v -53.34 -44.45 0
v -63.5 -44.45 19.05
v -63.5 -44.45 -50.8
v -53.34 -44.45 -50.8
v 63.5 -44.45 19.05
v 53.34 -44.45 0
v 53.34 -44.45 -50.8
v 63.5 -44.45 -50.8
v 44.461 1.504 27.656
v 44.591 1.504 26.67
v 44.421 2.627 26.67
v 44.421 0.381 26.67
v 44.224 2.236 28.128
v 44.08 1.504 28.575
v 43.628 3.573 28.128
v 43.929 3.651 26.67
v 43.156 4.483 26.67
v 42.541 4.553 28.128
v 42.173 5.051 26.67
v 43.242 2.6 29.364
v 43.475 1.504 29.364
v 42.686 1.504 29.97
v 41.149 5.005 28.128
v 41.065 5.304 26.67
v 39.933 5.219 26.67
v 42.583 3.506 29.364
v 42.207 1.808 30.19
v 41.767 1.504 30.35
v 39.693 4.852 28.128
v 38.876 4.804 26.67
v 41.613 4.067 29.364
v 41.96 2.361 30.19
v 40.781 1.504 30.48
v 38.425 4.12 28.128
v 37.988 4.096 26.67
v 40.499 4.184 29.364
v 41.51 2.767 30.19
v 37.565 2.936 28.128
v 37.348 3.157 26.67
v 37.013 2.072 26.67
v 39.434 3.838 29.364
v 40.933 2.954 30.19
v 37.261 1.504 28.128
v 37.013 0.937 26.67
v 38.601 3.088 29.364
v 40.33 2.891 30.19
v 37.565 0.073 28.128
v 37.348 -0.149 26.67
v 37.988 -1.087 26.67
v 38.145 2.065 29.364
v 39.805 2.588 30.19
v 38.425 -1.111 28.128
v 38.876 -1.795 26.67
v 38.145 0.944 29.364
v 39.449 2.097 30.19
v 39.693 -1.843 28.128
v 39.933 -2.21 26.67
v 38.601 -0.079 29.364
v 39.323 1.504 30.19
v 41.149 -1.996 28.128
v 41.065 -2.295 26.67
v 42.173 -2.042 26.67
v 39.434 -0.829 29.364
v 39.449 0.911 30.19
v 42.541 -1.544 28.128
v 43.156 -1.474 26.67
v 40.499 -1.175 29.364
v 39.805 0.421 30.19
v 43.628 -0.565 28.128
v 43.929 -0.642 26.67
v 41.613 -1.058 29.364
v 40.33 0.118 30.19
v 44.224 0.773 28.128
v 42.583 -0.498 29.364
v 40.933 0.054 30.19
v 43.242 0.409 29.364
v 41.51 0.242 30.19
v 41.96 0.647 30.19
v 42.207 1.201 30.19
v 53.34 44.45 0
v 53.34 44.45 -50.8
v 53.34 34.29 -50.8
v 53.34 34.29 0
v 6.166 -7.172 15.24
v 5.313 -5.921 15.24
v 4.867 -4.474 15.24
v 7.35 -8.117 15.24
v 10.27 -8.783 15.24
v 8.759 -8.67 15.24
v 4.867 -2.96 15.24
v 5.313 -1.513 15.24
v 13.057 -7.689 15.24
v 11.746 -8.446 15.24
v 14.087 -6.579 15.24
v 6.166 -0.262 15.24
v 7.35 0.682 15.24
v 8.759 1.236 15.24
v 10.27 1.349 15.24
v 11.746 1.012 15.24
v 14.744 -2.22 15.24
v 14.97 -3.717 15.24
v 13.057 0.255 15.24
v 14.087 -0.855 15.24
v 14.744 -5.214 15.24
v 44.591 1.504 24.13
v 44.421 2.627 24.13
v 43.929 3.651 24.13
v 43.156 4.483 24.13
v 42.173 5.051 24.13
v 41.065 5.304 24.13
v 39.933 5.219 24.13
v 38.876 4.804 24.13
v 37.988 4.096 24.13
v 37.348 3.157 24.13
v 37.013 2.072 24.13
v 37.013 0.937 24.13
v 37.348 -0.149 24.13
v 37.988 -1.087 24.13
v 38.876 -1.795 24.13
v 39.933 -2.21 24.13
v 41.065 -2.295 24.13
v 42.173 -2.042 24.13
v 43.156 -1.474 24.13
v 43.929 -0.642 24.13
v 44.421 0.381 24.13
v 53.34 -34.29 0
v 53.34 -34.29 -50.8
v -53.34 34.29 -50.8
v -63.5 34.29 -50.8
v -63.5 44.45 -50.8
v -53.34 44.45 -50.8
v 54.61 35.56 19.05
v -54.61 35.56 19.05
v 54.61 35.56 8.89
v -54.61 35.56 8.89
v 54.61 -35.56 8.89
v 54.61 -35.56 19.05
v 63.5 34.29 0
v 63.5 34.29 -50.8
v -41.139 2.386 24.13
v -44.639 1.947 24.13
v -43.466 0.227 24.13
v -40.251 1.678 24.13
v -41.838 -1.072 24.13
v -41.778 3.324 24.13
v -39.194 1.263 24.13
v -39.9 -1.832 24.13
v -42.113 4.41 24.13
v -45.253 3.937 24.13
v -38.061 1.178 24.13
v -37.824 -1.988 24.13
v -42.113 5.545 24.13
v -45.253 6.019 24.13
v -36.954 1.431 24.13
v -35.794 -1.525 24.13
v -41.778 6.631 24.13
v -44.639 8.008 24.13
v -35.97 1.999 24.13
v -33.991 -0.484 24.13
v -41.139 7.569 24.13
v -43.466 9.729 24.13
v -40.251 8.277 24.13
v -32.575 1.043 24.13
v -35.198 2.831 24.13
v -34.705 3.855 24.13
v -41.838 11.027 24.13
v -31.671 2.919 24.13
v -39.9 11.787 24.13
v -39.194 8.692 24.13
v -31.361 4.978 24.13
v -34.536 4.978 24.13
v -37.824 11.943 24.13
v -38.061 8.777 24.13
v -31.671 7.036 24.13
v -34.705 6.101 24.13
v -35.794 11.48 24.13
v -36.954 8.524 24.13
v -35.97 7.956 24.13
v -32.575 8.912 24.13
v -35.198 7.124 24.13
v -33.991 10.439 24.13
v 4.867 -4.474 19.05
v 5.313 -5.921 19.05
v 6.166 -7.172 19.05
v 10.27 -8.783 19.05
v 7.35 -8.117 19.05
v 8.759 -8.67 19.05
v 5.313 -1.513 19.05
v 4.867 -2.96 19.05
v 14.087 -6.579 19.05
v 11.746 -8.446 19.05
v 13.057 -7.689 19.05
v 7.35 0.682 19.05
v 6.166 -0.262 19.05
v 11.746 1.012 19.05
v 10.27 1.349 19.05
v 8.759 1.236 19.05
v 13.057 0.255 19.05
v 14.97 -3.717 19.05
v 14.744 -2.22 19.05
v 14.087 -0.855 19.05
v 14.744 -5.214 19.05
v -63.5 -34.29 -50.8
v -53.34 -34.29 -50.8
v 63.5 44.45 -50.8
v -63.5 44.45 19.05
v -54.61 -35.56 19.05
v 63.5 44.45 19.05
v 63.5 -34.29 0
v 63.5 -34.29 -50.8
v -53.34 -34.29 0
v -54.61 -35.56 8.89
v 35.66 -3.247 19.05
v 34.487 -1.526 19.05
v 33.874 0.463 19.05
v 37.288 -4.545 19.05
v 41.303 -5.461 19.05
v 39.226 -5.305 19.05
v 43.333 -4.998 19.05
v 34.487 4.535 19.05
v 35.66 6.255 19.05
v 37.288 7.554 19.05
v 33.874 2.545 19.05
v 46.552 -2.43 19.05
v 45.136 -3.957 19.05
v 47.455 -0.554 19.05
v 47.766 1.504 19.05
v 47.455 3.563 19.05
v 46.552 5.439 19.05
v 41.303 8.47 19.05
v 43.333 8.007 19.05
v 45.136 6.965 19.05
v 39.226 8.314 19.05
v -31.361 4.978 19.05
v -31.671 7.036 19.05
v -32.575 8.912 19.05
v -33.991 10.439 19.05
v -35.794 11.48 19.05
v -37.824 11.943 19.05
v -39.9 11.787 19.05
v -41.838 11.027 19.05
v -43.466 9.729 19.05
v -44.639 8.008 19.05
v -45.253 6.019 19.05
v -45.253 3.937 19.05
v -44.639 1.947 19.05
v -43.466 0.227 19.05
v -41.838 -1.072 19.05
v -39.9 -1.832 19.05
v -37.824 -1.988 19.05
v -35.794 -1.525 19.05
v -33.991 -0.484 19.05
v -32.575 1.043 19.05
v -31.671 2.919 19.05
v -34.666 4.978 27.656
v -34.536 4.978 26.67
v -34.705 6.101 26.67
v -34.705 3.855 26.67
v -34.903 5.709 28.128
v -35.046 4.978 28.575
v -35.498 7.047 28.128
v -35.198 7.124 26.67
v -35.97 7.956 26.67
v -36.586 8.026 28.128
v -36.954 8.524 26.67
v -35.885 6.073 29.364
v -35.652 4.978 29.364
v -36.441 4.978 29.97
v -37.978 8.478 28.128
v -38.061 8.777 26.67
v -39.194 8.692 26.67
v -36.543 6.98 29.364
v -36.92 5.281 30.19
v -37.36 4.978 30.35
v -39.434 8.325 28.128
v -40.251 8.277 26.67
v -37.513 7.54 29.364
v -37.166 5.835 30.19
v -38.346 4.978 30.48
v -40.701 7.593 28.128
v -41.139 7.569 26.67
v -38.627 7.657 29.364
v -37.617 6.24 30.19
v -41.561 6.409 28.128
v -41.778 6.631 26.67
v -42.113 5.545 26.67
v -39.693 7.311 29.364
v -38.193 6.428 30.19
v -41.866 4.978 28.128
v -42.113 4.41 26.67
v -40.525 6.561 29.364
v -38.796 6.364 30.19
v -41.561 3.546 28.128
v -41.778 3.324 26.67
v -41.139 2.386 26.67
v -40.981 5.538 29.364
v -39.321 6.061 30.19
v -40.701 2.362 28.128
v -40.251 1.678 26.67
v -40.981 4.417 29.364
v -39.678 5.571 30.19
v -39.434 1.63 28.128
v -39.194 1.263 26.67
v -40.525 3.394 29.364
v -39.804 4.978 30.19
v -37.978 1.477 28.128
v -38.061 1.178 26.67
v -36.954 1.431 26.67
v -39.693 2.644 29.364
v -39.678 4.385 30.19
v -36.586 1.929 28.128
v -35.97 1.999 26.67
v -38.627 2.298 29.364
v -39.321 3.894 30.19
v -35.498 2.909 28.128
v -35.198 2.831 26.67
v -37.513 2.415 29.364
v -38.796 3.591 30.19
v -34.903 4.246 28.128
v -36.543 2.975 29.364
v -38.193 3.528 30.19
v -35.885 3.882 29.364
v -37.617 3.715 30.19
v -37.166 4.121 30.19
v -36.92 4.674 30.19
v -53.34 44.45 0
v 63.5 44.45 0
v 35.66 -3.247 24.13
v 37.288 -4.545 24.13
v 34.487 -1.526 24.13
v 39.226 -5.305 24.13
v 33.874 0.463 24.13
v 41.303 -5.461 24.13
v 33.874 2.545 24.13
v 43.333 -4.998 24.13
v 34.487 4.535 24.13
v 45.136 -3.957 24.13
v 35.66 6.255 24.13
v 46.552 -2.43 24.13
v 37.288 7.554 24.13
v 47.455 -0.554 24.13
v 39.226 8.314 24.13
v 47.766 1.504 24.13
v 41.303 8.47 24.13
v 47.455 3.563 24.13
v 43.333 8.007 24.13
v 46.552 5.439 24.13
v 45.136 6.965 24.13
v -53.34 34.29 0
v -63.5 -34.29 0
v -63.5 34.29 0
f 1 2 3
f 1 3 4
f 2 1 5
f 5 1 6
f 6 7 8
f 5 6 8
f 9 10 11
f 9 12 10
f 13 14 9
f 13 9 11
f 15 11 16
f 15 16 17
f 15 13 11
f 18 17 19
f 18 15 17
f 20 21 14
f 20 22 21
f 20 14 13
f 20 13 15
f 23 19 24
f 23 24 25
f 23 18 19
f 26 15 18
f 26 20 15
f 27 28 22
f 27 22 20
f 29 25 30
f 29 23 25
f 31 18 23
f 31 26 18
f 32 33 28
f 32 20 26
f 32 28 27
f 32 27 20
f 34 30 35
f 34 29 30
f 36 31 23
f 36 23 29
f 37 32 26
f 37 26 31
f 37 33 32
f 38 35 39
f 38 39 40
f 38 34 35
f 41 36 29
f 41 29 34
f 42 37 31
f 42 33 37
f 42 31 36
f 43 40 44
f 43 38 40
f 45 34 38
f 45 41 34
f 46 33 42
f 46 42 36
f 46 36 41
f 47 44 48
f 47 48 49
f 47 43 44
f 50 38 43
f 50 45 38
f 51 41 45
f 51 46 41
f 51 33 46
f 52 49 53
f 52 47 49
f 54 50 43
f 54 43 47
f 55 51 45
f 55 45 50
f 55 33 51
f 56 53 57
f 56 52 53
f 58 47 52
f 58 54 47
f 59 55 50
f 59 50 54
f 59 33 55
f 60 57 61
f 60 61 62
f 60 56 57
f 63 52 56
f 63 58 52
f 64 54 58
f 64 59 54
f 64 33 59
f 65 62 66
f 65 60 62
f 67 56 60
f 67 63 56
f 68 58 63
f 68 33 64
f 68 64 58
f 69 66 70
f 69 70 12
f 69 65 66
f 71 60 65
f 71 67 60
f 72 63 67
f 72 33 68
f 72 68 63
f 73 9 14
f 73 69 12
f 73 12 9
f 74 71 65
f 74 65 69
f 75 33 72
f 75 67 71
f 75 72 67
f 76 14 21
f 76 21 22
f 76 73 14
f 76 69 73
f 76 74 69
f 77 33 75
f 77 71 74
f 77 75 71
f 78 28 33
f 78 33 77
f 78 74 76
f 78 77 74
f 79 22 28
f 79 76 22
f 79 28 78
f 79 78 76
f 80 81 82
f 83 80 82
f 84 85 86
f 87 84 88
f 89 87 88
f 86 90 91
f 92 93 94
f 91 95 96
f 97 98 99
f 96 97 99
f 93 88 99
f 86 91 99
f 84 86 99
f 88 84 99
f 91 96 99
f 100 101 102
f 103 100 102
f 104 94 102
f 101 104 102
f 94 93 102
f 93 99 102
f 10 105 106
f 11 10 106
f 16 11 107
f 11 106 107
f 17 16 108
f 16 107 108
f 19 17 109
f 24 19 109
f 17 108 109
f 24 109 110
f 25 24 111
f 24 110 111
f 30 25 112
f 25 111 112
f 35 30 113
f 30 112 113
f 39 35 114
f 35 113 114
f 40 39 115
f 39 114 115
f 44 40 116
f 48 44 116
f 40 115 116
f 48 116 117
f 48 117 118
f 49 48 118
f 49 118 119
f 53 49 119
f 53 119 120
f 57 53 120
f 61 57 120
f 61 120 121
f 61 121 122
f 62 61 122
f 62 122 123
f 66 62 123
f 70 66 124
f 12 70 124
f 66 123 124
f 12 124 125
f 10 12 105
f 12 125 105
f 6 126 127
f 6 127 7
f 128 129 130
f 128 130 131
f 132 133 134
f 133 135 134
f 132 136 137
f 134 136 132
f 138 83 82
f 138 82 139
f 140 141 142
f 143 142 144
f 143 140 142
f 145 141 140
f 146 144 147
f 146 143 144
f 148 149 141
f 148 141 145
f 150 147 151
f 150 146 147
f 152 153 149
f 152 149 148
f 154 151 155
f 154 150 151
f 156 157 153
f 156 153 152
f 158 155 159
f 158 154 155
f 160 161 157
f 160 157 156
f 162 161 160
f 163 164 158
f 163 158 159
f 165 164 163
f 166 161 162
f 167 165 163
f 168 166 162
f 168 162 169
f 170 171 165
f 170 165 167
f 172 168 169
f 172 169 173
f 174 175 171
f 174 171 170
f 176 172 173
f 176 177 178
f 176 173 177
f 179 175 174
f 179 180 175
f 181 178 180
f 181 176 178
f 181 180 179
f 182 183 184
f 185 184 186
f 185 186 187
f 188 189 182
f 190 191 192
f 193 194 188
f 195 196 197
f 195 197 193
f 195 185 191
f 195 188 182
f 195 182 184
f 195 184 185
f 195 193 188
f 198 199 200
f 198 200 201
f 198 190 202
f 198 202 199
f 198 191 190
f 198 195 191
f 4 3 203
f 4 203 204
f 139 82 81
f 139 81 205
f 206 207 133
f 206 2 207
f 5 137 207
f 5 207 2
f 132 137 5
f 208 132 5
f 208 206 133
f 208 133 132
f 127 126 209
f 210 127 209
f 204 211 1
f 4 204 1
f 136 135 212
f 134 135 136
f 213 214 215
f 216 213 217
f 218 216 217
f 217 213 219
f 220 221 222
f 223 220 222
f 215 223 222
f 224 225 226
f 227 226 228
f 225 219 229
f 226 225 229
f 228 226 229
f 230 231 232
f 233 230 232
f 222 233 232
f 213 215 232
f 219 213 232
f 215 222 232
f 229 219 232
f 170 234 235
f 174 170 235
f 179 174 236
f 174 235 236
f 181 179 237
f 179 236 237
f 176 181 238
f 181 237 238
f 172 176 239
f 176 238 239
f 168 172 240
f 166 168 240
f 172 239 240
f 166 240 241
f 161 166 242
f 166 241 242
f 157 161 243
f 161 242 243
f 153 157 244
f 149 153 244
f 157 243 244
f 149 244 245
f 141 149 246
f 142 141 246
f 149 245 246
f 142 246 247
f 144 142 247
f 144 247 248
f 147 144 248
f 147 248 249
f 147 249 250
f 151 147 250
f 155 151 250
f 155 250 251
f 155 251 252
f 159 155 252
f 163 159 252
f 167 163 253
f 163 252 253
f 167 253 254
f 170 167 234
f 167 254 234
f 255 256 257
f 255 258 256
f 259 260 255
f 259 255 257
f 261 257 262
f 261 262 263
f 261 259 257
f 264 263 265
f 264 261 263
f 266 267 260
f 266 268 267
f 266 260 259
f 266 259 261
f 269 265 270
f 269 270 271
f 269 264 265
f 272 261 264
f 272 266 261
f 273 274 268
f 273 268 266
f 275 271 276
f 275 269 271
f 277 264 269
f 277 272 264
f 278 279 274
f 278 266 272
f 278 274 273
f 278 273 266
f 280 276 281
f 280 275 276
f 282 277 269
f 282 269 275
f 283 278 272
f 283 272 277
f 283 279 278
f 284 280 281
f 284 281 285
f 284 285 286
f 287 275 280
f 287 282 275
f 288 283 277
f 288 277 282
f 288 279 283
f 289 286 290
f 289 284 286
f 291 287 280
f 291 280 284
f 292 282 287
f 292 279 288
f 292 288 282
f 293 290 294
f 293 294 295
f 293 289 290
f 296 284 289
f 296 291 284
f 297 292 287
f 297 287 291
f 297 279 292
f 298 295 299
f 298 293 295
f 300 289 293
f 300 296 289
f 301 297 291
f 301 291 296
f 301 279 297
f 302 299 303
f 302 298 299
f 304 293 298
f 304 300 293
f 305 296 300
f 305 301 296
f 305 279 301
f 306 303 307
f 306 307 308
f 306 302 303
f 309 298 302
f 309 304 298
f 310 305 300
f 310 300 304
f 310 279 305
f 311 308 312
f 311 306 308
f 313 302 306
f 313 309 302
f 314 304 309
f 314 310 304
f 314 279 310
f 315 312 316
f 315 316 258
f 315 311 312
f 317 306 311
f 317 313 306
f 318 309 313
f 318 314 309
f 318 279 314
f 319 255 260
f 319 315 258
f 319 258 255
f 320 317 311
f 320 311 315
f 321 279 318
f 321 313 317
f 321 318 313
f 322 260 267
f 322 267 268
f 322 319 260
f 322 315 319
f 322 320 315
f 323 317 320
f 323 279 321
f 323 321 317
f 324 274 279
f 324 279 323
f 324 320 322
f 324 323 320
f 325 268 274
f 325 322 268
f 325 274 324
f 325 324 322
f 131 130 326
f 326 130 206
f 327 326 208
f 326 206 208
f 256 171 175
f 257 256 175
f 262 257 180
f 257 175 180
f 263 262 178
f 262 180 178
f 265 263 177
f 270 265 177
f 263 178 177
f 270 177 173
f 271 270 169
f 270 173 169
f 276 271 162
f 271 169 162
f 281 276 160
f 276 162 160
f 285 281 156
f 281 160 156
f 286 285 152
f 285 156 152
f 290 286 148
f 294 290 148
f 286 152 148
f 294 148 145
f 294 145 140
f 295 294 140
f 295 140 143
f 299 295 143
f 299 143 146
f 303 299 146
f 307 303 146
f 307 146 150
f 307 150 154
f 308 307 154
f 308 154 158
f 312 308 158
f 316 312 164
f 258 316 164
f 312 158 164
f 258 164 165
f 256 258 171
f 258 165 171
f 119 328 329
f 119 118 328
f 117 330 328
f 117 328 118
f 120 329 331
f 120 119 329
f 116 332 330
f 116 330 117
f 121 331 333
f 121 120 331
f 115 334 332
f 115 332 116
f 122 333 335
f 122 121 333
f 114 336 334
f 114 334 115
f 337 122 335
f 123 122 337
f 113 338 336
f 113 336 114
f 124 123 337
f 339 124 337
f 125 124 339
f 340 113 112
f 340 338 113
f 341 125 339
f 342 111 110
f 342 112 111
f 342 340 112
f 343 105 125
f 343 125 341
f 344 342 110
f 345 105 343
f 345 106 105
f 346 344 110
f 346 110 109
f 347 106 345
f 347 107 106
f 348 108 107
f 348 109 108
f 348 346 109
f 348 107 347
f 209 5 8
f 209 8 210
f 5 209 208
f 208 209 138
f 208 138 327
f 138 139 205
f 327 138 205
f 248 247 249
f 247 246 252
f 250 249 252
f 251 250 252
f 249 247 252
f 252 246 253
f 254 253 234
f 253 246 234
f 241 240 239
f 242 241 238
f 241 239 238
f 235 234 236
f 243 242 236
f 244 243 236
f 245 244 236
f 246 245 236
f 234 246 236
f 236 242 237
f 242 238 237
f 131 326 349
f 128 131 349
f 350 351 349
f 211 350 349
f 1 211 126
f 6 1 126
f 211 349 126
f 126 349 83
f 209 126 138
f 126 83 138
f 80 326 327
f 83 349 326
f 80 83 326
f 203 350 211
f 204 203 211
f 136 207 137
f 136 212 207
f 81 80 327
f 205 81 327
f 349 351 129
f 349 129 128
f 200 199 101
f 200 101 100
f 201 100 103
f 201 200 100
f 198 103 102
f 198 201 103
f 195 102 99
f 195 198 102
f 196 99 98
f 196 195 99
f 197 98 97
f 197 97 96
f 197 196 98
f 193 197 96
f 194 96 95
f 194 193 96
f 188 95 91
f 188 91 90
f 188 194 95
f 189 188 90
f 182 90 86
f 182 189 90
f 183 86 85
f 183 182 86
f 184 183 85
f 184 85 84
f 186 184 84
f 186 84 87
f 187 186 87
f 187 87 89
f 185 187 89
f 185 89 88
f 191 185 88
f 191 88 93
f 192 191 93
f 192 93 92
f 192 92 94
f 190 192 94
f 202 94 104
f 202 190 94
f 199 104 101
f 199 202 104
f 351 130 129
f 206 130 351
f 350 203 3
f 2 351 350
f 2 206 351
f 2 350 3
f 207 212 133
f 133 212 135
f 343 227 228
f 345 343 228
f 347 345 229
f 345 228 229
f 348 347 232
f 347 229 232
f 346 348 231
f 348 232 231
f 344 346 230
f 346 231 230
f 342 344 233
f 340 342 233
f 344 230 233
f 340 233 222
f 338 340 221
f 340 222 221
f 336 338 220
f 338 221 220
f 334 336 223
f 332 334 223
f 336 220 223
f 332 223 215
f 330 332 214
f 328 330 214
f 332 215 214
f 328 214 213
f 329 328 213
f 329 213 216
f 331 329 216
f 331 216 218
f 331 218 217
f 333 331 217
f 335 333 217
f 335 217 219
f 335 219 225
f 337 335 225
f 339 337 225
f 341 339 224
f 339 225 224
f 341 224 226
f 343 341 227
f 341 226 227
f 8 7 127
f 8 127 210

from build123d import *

# Parameters (mm, degrees)
F0_W      = 127
F0_H      = 88.9
F1_DEPTH  = 19.05
F3_T      = -8.89
F4_W      = 10.16
F4_H      = 10.16
F4_H_2    = 10.159999
F5_DEPTH  = 50.8
F6_R      = 5.08
F7_DEPTH  = 3.81
F8_R      = 6.985
F9_DEPTH  = 5.08
F10_R     = 3.81
F11_DEPTH = 6.35
F12_R     = 3.81
F13_R     = 6.985
F14_DEPTH = 5.08
F15_R     = 3.81
F16_DEPTH = 6.35
F17_R     = 3.81


with BuildPart() as f1:
    # F0 (on Top) → F1 (new body)
    with BuildSketch(Plane.XY):
        Rectangle(F0_W, F0_H)
    extrude(amount=F1_DEPTH)

    # F3
    f3_openings = [f1.faces().sort_by_distance(p)[0] for p in [
        (0, 0, 19.05),
    ]]
    offset(amount=F3_T, openings=f3_openings)

    # F4 (on face) → F5 (join)
    with BuildSketch(Plane(origin=(0, 0, 0), x_dir=(1, 0, 0), z_dir=(0, 0, -1))):
        with Locations((-58.42, -39.37)):
            Rectangle(F4_W, F4_H)
        with Locations((58.42, -39.37)):
            Rectangle(F4_W, F4_H_2)
        with Locations((-58.42, 39.37)):
            Rectangle(F4_W, F4_H)
        with Locations((58.42, 39.37)):
            Rectangle(F4_W, F4_H)
    extrude(amount=F5_DEPTH)


with BuildPart() as f7:
    # F6 (on face) → F7 (new body)
    with BuildSketch(Plane.XY.offset(19.05)):
        with Locations((9.889903, -3.717116)):
            Circle(F6_R)
    extrude(amount=-F7_DEPTH)


with BuildPart() as f9:
    # F8 (on face) → F9 (new body)
    with BuildSketch(Plane.XY.offset(19.05)):
        with Locations((40.78066, 1.504392)):
            Circle(F8_R)
    extrude(amount=F9_DEPTH)

    # F10 (on face) → F11 (join)
    with BuildSketch(Plane.XY.offset(24.13)):
        with Locations((40.78066, 1.504392)):
            Circle(F10_R)
    extrude(amount=F11_DEPTH)

    # F12
    f12_edges = [f9.edges().sort_by_distance(p)[0] for p in [
        (36.97066, 1.504392, 30.48),
    ]]
    fillet(f12_edges, radius=F12_R)


with BuildPart() as f14:
    # F13 (on face) → F14 (new body)
    with BuildSketch(Plane.XY.offset(19.05)):
        with Locations((-38.345806, 4.977581)):
            Circle(F13_R)
    extrude(amount=F14_DEPTH)

    # F15 (on face) → F16 (join)
    with BuildSketch(Plane.XY.offset(24.13)):
        with Locations((-38.345806, 4.977581)):
            Circle(F15_R)
    extrude(amount=F16_DEPTH)

    # F17
    f17_edges = [f14.edges().sort_by_distance(p)[0] for p in [
        (-42.155806, 4.977581, 30.48),
    ]]
    fillet(f17_edges, radius=F17_R)


solid = Compound([f1.part, f7.part, f9.part, f14.part])
